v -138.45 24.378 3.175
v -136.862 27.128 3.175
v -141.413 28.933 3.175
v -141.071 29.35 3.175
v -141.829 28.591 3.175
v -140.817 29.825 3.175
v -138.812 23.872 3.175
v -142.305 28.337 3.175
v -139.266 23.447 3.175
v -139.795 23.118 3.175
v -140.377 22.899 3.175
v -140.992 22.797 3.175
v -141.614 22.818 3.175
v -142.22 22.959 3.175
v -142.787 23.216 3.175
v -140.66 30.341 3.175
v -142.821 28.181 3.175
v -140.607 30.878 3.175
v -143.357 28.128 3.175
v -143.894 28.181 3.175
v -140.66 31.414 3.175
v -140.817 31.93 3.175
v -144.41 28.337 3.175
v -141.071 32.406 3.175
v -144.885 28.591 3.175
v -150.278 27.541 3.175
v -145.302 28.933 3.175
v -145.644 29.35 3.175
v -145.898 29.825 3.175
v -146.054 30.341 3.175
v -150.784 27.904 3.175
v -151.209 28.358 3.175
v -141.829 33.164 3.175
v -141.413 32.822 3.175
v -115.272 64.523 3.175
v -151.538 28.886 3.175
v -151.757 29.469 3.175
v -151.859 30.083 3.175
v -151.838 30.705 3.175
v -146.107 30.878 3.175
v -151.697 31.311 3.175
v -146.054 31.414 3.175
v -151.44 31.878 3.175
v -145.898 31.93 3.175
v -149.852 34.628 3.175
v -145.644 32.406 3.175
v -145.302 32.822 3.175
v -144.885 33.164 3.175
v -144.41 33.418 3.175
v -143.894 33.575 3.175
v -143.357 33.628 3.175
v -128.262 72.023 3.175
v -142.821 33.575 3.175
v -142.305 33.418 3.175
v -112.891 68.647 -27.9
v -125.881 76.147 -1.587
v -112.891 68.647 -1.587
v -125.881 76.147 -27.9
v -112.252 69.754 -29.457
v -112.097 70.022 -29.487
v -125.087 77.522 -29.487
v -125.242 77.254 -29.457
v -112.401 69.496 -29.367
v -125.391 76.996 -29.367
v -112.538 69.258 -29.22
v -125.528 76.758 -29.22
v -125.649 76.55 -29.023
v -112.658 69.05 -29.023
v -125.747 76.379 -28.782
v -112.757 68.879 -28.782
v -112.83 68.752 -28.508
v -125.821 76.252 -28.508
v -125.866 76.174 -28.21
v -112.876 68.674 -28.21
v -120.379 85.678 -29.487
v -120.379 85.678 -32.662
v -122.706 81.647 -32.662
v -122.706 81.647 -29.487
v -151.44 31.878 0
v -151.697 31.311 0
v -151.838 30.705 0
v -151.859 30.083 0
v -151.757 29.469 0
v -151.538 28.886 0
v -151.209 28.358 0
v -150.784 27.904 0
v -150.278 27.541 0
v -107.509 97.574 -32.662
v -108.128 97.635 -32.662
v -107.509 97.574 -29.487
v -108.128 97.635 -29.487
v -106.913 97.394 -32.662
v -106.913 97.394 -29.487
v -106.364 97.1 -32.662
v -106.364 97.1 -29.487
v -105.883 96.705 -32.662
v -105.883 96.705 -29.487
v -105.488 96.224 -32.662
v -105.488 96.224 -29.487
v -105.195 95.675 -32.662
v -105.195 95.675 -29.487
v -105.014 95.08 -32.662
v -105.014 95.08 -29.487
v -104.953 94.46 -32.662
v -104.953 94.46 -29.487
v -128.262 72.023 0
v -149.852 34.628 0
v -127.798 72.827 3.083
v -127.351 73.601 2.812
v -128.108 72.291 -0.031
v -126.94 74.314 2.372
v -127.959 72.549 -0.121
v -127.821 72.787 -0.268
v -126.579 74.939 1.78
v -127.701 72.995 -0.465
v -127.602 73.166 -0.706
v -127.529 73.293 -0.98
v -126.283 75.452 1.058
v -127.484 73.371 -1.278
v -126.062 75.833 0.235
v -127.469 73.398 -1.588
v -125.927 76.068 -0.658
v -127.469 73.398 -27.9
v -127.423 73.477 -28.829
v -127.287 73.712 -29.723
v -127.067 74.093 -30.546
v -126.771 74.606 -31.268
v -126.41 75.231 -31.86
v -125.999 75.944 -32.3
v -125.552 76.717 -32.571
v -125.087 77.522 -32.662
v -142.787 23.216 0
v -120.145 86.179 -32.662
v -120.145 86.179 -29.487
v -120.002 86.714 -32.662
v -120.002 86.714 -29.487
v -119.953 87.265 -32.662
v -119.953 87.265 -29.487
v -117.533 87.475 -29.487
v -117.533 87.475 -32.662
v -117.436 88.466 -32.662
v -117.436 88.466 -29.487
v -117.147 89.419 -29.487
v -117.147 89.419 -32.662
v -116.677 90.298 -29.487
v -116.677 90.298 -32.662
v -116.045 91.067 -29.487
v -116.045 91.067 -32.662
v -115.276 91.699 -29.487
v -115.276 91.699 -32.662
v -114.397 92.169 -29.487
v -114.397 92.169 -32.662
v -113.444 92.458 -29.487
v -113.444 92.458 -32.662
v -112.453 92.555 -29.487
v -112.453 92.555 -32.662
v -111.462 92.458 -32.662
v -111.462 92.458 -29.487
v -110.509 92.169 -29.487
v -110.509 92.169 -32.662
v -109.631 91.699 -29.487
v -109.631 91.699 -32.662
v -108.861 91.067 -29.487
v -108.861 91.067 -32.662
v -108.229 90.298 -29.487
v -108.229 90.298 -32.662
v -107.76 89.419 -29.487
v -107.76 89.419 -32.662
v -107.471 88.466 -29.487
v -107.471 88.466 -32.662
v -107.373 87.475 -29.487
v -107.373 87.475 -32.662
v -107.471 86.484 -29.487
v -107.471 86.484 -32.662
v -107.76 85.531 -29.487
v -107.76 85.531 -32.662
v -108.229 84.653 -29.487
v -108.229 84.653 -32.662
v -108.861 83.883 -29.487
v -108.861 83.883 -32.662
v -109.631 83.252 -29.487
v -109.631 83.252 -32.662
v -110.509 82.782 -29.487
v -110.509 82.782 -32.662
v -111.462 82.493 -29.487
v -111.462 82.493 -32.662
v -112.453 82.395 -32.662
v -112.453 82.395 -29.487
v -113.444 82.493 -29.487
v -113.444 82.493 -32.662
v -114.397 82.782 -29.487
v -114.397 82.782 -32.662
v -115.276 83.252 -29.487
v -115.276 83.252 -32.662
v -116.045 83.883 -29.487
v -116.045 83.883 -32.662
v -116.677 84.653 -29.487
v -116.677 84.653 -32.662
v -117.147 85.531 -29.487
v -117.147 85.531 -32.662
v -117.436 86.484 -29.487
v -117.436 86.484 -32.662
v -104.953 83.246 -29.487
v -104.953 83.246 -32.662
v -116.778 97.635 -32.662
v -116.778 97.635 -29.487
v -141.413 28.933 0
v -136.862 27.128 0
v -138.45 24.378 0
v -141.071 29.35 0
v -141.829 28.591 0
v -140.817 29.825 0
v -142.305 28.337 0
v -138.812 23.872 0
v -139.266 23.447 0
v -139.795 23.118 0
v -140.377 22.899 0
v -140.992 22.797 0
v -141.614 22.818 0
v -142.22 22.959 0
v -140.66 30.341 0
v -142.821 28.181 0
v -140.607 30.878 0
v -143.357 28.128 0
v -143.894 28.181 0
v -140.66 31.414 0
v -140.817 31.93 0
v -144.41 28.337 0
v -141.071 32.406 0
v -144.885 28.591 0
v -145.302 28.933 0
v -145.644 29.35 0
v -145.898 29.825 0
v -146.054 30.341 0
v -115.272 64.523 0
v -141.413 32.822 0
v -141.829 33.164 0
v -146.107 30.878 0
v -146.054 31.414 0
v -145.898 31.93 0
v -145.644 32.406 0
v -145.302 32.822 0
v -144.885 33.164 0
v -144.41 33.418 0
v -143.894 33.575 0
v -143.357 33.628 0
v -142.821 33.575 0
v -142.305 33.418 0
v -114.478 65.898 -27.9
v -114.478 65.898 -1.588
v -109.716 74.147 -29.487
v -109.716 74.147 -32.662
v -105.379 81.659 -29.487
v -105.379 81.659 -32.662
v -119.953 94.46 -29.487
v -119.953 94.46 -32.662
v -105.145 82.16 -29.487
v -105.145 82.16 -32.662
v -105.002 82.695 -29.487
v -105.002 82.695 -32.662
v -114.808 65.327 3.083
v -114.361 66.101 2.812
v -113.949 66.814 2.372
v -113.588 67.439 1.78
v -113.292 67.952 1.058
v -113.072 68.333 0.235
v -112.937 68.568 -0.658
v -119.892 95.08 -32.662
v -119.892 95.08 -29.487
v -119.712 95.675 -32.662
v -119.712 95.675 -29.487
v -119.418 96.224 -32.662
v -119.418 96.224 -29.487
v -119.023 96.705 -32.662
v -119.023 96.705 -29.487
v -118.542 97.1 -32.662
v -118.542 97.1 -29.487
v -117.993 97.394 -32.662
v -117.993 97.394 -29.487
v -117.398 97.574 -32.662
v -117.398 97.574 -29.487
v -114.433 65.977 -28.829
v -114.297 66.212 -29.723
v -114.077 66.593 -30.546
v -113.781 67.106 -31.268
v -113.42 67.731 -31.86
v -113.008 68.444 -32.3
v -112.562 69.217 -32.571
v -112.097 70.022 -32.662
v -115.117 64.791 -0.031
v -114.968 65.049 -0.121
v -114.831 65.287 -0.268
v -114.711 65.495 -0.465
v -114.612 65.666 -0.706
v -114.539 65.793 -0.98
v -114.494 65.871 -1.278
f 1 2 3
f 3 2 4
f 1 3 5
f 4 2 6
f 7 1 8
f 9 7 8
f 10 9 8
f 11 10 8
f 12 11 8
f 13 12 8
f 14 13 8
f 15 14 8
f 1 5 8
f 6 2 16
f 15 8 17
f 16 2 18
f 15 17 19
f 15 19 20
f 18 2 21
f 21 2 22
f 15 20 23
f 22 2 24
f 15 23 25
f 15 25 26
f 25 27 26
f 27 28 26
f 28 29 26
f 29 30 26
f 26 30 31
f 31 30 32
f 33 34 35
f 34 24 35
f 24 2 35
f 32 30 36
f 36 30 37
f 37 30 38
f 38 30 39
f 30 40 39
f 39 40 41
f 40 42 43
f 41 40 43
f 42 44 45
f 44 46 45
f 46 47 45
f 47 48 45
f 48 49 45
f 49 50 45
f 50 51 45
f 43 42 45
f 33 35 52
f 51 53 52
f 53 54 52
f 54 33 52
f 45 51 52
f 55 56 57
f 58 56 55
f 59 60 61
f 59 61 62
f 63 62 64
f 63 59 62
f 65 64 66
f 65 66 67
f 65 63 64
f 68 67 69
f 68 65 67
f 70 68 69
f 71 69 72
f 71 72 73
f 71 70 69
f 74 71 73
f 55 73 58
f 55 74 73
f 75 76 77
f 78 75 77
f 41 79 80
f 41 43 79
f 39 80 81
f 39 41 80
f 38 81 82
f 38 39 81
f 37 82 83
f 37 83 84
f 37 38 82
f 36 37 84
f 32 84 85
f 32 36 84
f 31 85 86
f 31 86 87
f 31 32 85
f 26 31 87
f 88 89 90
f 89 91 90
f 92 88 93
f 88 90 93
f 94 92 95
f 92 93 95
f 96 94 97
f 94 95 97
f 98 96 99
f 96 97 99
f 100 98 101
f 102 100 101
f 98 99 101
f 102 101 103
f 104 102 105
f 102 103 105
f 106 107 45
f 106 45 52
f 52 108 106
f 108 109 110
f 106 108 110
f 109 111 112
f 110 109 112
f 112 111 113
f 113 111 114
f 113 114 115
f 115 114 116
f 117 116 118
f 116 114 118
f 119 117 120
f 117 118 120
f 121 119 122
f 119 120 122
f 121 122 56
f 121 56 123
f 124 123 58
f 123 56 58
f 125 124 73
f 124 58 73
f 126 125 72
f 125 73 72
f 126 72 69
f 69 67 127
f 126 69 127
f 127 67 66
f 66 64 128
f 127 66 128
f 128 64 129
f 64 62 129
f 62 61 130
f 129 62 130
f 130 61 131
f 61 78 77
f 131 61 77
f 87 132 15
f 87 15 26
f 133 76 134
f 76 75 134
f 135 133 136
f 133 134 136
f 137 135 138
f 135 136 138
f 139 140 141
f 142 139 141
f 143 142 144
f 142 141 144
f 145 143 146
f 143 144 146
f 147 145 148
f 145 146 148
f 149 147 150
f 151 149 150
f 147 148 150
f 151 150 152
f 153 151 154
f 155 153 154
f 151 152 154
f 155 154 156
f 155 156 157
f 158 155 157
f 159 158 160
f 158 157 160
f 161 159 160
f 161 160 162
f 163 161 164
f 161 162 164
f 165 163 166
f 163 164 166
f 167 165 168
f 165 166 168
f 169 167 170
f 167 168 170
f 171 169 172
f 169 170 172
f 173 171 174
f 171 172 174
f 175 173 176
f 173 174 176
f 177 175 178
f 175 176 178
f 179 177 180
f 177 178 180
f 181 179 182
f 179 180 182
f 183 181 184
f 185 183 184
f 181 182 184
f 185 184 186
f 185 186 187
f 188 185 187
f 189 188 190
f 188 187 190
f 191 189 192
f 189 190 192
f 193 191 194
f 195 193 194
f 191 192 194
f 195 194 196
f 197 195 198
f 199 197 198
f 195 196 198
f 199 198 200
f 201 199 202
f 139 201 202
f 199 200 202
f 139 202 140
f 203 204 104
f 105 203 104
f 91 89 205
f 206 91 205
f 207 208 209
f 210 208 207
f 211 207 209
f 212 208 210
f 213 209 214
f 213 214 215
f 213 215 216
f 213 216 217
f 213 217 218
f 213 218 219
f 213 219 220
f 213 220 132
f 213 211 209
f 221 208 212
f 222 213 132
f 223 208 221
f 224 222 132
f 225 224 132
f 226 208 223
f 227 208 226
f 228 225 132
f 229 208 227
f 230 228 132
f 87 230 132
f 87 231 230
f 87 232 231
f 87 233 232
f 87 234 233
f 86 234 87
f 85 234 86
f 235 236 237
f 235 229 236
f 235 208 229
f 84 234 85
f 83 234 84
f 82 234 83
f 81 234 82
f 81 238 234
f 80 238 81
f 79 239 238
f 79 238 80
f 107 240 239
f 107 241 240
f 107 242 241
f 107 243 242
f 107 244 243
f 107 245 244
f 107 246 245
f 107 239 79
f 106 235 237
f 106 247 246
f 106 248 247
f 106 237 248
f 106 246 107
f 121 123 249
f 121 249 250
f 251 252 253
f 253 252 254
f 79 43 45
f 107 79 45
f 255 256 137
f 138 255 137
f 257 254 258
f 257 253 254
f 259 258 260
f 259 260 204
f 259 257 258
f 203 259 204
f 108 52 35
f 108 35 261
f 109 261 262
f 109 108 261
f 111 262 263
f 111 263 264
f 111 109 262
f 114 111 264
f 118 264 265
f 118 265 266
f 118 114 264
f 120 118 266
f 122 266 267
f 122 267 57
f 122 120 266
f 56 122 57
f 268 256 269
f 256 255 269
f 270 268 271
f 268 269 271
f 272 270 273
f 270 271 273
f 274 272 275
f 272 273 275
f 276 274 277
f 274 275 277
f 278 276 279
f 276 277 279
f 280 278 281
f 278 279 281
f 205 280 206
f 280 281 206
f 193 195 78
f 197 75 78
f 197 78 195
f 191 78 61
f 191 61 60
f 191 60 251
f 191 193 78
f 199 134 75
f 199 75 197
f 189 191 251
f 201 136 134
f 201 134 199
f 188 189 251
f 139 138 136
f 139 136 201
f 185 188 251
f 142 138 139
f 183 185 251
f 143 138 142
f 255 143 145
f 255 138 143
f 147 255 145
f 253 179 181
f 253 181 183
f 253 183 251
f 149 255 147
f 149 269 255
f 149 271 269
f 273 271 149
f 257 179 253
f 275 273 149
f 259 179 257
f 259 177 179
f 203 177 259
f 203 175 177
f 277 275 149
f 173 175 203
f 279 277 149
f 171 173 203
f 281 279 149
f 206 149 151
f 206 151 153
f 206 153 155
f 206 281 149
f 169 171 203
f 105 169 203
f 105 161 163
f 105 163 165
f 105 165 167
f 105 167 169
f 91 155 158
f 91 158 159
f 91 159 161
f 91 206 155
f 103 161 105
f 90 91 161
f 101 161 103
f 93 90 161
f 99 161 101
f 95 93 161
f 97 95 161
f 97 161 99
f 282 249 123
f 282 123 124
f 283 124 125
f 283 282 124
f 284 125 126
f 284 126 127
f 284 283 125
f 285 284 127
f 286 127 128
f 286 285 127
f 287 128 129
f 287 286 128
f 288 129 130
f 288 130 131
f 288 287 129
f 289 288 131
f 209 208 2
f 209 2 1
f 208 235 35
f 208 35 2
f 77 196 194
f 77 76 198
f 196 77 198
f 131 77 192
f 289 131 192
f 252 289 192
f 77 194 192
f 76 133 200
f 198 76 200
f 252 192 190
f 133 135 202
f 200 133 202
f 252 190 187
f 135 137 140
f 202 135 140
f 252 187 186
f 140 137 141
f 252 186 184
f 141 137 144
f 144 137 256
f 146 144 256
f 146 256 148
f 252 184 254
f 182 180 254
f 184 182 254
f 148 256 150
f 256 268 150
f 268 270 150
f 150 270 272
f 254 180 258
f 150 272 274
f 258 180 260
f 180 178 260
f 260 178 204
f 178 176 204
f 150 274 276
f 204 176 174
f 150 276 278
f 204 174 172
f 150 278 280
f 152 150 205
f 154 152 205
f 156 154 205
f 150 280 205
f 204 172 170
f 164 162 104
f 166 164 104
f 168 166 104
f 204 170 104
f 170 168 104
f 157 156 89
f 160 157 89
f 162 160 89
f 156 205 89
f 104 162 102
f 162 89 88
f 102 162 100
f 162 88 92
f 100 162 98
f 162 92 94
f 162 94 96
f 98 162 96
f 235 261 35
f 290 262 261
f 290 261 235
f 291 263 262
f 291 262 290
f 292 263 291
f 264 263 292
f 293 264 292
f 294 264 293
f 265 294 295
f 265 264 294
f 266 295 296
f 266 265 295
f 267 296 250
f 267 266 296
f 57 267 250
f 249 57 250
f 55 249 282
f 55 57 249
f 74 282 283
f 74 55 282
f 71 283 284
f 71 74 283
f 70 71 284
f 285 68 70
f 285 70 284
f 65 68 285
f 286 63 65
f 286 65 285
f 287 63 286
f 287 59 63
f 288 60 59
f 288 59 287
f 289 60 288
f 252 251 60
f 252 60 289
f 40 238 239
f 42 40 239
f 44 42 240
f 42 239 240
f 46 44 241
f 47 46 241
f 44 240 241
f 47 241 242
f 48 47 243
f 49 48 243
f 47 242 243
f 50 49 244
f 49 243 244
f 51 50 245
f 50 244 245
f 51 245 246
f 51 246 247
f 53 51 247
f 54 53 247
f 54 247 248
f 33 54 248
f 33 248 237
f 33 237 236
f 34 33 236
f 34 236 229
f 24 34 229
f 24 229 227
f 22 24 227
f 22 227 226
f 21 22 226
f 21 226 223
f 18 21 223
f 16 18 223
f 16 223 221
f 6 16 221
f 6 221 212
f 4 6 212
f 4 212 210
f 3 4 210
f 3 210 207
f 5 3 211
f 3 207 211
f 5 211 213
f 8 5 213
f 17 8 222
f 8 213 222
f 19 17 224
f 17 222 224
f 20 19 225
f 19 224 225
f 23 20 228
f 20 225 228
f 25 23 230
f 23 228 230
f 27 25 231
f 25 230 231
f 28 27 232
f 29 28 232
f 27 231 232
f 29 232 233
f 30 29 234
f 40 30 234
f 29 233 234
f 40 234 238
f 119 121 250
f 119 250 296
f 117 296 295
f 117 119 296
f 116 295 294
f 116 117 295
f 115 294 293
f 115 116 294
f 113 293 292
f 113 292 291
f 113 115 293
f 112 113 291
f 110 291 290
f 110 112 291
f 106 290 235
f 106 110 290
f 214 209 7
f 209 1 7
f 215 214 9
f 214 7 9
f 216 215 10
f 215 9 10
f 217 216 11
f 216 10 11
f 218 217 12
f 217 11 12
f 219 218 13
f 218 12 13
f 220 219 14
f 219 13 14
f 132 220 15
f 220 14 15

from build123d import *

# Parameters (mm, degrees)
BASE_FLANGE1_DEPTH   = 3.175
EDGE_FLANGE1_DEPTH   = 15
EDGE_FLANGE2_DEPTH   = 15
SKETCH15_R           = 5.08
BOSS_EXTRUDE1_DEPTH  = 3.175
M5_CLEARANCE_HOLE1_D = 5.5
FILLET1_R            = 3.175


# Sheet-metal steps are written as plain solids
with BuildPart() as part:
    # Sketch2 → Base-Flange1 (new body)
    with BuildSketch(Plane.XY):
        Polygon((-136.862074611, 27.127820722), (-140.037074611, 21.628559408), (-153.027455668, 29.128559408), (-149.852455668, 34.627820722), (-128.262455668, 72.022797657), (-115.272074611, 64.522797657), align=None)
    extrude(amount=BASE_FLANGE1_DEPTH)

    # Edge-Flange1 section (across the edge) → Edge-Flange1 (add)
    with BuildSketch(Plane(origin=(-127.468705668, 73.397612986, 0), x_dir=(-0.49999999999999706, -0.8660254037844404, -3.491481338843133e-15), z_dir=(0.8660254037844404, -0.49999999999999706, 0))):
        with BuildLine():
            Line((-3.175, 1.5875), (-3.175, 27.899995))
            Line((-3.175, 27.899995), (0, 27.899995))
            Line((0, 27.899995), (0, 1.5875))
            ThreePointArc((0, 1.5875), (0.464967985, 0.464967985), (1.5875, 0))
            Line((1.5875, 0), (1.5875, -3.175))
            ThreePointArc((1.5875, -3.175), (-1.780096045, -1.780096045), (-3.175, 1.5875))
        make_face()
    extrude(amount=EDGE_FLANGE1_DEPTH)

    # Edge-Flange2 section (across the edge) → Edge-Flange2 (add)
    with BuildSketch(Plane(origin=(-112.890824611, 68.647243643, -29.487495), x_dir=(0, 0, 1), z_dir=(-0.8660254037844405, 0.4999999999999967, 0))):
        with BuildLine():
            Line((-3.175, 1.5875), (-3.175, 6.35))
            Line((-3.175, 6.35), (0, 6.35))
            Line((0, 6.35), (0, 1.5875))
            ThreePointArc((0, 1.5875), (0.464967985, 0.464967985), (1.5875, 0))
            Line((1.5875, 0), (1.5875, -3.175))
            ThreePointArc((1.5875, -3.175), (-1.780096045, -1.780096045), (-3.175, 1.5875))
        make_face()
    extrude(amount=EDGE_FLANGE2_DEPTH)

    # Sketch15 → Boss-Extrude1 (add)
    with BuildSketch(Plane(origin=(0, 0, -32.662495), x_dir=(-1, 0, 0), z_dir=(0, 0, -1))):
        Polygon((122.706205668, 81.646504957), (109.715824611, 74.146504957), (104.953324611, 82.395396928), (104.953324611, 97.635396928), (119.953324611, 97.635396928), (119.953324611, 86.414634815), align=None)
        with Locations((112.453324611, 87.475396928)):
            Circle(SKETCH15_R, mode=Mode.SUBTRACT)
    extrude(amount=-BOSS_EXTRUDE1_DEPTH)

    # M5 Clearance Hole1 (through all)
    with Locations(Plane.XY.offset(3.175)):
        with Locations((-143.35726514, 30.877820722)):
            Hole(M5_CLEARANCE_HOLE1_D / 2)

    # Fillet1
    fillet1_edges = [part.edges().sort_by_distance(p)[0] for p in [
        (-140.037074611, 21.628559408, 1.5875),
        (-153.027455668, 29.128559408, 1.5875),
        (-119.953324611, 86.414634815, -31.074995),
        (-104.953324611, 82.395396928, -31.074995),
        (-104.953324611, 97.635396928, -31.074995),
        (-119.953324611, 97.635396928, -31.074995),
    ]]
    fillet(fillet1_edges, radius=FILLET1_R)


solid = part.part
